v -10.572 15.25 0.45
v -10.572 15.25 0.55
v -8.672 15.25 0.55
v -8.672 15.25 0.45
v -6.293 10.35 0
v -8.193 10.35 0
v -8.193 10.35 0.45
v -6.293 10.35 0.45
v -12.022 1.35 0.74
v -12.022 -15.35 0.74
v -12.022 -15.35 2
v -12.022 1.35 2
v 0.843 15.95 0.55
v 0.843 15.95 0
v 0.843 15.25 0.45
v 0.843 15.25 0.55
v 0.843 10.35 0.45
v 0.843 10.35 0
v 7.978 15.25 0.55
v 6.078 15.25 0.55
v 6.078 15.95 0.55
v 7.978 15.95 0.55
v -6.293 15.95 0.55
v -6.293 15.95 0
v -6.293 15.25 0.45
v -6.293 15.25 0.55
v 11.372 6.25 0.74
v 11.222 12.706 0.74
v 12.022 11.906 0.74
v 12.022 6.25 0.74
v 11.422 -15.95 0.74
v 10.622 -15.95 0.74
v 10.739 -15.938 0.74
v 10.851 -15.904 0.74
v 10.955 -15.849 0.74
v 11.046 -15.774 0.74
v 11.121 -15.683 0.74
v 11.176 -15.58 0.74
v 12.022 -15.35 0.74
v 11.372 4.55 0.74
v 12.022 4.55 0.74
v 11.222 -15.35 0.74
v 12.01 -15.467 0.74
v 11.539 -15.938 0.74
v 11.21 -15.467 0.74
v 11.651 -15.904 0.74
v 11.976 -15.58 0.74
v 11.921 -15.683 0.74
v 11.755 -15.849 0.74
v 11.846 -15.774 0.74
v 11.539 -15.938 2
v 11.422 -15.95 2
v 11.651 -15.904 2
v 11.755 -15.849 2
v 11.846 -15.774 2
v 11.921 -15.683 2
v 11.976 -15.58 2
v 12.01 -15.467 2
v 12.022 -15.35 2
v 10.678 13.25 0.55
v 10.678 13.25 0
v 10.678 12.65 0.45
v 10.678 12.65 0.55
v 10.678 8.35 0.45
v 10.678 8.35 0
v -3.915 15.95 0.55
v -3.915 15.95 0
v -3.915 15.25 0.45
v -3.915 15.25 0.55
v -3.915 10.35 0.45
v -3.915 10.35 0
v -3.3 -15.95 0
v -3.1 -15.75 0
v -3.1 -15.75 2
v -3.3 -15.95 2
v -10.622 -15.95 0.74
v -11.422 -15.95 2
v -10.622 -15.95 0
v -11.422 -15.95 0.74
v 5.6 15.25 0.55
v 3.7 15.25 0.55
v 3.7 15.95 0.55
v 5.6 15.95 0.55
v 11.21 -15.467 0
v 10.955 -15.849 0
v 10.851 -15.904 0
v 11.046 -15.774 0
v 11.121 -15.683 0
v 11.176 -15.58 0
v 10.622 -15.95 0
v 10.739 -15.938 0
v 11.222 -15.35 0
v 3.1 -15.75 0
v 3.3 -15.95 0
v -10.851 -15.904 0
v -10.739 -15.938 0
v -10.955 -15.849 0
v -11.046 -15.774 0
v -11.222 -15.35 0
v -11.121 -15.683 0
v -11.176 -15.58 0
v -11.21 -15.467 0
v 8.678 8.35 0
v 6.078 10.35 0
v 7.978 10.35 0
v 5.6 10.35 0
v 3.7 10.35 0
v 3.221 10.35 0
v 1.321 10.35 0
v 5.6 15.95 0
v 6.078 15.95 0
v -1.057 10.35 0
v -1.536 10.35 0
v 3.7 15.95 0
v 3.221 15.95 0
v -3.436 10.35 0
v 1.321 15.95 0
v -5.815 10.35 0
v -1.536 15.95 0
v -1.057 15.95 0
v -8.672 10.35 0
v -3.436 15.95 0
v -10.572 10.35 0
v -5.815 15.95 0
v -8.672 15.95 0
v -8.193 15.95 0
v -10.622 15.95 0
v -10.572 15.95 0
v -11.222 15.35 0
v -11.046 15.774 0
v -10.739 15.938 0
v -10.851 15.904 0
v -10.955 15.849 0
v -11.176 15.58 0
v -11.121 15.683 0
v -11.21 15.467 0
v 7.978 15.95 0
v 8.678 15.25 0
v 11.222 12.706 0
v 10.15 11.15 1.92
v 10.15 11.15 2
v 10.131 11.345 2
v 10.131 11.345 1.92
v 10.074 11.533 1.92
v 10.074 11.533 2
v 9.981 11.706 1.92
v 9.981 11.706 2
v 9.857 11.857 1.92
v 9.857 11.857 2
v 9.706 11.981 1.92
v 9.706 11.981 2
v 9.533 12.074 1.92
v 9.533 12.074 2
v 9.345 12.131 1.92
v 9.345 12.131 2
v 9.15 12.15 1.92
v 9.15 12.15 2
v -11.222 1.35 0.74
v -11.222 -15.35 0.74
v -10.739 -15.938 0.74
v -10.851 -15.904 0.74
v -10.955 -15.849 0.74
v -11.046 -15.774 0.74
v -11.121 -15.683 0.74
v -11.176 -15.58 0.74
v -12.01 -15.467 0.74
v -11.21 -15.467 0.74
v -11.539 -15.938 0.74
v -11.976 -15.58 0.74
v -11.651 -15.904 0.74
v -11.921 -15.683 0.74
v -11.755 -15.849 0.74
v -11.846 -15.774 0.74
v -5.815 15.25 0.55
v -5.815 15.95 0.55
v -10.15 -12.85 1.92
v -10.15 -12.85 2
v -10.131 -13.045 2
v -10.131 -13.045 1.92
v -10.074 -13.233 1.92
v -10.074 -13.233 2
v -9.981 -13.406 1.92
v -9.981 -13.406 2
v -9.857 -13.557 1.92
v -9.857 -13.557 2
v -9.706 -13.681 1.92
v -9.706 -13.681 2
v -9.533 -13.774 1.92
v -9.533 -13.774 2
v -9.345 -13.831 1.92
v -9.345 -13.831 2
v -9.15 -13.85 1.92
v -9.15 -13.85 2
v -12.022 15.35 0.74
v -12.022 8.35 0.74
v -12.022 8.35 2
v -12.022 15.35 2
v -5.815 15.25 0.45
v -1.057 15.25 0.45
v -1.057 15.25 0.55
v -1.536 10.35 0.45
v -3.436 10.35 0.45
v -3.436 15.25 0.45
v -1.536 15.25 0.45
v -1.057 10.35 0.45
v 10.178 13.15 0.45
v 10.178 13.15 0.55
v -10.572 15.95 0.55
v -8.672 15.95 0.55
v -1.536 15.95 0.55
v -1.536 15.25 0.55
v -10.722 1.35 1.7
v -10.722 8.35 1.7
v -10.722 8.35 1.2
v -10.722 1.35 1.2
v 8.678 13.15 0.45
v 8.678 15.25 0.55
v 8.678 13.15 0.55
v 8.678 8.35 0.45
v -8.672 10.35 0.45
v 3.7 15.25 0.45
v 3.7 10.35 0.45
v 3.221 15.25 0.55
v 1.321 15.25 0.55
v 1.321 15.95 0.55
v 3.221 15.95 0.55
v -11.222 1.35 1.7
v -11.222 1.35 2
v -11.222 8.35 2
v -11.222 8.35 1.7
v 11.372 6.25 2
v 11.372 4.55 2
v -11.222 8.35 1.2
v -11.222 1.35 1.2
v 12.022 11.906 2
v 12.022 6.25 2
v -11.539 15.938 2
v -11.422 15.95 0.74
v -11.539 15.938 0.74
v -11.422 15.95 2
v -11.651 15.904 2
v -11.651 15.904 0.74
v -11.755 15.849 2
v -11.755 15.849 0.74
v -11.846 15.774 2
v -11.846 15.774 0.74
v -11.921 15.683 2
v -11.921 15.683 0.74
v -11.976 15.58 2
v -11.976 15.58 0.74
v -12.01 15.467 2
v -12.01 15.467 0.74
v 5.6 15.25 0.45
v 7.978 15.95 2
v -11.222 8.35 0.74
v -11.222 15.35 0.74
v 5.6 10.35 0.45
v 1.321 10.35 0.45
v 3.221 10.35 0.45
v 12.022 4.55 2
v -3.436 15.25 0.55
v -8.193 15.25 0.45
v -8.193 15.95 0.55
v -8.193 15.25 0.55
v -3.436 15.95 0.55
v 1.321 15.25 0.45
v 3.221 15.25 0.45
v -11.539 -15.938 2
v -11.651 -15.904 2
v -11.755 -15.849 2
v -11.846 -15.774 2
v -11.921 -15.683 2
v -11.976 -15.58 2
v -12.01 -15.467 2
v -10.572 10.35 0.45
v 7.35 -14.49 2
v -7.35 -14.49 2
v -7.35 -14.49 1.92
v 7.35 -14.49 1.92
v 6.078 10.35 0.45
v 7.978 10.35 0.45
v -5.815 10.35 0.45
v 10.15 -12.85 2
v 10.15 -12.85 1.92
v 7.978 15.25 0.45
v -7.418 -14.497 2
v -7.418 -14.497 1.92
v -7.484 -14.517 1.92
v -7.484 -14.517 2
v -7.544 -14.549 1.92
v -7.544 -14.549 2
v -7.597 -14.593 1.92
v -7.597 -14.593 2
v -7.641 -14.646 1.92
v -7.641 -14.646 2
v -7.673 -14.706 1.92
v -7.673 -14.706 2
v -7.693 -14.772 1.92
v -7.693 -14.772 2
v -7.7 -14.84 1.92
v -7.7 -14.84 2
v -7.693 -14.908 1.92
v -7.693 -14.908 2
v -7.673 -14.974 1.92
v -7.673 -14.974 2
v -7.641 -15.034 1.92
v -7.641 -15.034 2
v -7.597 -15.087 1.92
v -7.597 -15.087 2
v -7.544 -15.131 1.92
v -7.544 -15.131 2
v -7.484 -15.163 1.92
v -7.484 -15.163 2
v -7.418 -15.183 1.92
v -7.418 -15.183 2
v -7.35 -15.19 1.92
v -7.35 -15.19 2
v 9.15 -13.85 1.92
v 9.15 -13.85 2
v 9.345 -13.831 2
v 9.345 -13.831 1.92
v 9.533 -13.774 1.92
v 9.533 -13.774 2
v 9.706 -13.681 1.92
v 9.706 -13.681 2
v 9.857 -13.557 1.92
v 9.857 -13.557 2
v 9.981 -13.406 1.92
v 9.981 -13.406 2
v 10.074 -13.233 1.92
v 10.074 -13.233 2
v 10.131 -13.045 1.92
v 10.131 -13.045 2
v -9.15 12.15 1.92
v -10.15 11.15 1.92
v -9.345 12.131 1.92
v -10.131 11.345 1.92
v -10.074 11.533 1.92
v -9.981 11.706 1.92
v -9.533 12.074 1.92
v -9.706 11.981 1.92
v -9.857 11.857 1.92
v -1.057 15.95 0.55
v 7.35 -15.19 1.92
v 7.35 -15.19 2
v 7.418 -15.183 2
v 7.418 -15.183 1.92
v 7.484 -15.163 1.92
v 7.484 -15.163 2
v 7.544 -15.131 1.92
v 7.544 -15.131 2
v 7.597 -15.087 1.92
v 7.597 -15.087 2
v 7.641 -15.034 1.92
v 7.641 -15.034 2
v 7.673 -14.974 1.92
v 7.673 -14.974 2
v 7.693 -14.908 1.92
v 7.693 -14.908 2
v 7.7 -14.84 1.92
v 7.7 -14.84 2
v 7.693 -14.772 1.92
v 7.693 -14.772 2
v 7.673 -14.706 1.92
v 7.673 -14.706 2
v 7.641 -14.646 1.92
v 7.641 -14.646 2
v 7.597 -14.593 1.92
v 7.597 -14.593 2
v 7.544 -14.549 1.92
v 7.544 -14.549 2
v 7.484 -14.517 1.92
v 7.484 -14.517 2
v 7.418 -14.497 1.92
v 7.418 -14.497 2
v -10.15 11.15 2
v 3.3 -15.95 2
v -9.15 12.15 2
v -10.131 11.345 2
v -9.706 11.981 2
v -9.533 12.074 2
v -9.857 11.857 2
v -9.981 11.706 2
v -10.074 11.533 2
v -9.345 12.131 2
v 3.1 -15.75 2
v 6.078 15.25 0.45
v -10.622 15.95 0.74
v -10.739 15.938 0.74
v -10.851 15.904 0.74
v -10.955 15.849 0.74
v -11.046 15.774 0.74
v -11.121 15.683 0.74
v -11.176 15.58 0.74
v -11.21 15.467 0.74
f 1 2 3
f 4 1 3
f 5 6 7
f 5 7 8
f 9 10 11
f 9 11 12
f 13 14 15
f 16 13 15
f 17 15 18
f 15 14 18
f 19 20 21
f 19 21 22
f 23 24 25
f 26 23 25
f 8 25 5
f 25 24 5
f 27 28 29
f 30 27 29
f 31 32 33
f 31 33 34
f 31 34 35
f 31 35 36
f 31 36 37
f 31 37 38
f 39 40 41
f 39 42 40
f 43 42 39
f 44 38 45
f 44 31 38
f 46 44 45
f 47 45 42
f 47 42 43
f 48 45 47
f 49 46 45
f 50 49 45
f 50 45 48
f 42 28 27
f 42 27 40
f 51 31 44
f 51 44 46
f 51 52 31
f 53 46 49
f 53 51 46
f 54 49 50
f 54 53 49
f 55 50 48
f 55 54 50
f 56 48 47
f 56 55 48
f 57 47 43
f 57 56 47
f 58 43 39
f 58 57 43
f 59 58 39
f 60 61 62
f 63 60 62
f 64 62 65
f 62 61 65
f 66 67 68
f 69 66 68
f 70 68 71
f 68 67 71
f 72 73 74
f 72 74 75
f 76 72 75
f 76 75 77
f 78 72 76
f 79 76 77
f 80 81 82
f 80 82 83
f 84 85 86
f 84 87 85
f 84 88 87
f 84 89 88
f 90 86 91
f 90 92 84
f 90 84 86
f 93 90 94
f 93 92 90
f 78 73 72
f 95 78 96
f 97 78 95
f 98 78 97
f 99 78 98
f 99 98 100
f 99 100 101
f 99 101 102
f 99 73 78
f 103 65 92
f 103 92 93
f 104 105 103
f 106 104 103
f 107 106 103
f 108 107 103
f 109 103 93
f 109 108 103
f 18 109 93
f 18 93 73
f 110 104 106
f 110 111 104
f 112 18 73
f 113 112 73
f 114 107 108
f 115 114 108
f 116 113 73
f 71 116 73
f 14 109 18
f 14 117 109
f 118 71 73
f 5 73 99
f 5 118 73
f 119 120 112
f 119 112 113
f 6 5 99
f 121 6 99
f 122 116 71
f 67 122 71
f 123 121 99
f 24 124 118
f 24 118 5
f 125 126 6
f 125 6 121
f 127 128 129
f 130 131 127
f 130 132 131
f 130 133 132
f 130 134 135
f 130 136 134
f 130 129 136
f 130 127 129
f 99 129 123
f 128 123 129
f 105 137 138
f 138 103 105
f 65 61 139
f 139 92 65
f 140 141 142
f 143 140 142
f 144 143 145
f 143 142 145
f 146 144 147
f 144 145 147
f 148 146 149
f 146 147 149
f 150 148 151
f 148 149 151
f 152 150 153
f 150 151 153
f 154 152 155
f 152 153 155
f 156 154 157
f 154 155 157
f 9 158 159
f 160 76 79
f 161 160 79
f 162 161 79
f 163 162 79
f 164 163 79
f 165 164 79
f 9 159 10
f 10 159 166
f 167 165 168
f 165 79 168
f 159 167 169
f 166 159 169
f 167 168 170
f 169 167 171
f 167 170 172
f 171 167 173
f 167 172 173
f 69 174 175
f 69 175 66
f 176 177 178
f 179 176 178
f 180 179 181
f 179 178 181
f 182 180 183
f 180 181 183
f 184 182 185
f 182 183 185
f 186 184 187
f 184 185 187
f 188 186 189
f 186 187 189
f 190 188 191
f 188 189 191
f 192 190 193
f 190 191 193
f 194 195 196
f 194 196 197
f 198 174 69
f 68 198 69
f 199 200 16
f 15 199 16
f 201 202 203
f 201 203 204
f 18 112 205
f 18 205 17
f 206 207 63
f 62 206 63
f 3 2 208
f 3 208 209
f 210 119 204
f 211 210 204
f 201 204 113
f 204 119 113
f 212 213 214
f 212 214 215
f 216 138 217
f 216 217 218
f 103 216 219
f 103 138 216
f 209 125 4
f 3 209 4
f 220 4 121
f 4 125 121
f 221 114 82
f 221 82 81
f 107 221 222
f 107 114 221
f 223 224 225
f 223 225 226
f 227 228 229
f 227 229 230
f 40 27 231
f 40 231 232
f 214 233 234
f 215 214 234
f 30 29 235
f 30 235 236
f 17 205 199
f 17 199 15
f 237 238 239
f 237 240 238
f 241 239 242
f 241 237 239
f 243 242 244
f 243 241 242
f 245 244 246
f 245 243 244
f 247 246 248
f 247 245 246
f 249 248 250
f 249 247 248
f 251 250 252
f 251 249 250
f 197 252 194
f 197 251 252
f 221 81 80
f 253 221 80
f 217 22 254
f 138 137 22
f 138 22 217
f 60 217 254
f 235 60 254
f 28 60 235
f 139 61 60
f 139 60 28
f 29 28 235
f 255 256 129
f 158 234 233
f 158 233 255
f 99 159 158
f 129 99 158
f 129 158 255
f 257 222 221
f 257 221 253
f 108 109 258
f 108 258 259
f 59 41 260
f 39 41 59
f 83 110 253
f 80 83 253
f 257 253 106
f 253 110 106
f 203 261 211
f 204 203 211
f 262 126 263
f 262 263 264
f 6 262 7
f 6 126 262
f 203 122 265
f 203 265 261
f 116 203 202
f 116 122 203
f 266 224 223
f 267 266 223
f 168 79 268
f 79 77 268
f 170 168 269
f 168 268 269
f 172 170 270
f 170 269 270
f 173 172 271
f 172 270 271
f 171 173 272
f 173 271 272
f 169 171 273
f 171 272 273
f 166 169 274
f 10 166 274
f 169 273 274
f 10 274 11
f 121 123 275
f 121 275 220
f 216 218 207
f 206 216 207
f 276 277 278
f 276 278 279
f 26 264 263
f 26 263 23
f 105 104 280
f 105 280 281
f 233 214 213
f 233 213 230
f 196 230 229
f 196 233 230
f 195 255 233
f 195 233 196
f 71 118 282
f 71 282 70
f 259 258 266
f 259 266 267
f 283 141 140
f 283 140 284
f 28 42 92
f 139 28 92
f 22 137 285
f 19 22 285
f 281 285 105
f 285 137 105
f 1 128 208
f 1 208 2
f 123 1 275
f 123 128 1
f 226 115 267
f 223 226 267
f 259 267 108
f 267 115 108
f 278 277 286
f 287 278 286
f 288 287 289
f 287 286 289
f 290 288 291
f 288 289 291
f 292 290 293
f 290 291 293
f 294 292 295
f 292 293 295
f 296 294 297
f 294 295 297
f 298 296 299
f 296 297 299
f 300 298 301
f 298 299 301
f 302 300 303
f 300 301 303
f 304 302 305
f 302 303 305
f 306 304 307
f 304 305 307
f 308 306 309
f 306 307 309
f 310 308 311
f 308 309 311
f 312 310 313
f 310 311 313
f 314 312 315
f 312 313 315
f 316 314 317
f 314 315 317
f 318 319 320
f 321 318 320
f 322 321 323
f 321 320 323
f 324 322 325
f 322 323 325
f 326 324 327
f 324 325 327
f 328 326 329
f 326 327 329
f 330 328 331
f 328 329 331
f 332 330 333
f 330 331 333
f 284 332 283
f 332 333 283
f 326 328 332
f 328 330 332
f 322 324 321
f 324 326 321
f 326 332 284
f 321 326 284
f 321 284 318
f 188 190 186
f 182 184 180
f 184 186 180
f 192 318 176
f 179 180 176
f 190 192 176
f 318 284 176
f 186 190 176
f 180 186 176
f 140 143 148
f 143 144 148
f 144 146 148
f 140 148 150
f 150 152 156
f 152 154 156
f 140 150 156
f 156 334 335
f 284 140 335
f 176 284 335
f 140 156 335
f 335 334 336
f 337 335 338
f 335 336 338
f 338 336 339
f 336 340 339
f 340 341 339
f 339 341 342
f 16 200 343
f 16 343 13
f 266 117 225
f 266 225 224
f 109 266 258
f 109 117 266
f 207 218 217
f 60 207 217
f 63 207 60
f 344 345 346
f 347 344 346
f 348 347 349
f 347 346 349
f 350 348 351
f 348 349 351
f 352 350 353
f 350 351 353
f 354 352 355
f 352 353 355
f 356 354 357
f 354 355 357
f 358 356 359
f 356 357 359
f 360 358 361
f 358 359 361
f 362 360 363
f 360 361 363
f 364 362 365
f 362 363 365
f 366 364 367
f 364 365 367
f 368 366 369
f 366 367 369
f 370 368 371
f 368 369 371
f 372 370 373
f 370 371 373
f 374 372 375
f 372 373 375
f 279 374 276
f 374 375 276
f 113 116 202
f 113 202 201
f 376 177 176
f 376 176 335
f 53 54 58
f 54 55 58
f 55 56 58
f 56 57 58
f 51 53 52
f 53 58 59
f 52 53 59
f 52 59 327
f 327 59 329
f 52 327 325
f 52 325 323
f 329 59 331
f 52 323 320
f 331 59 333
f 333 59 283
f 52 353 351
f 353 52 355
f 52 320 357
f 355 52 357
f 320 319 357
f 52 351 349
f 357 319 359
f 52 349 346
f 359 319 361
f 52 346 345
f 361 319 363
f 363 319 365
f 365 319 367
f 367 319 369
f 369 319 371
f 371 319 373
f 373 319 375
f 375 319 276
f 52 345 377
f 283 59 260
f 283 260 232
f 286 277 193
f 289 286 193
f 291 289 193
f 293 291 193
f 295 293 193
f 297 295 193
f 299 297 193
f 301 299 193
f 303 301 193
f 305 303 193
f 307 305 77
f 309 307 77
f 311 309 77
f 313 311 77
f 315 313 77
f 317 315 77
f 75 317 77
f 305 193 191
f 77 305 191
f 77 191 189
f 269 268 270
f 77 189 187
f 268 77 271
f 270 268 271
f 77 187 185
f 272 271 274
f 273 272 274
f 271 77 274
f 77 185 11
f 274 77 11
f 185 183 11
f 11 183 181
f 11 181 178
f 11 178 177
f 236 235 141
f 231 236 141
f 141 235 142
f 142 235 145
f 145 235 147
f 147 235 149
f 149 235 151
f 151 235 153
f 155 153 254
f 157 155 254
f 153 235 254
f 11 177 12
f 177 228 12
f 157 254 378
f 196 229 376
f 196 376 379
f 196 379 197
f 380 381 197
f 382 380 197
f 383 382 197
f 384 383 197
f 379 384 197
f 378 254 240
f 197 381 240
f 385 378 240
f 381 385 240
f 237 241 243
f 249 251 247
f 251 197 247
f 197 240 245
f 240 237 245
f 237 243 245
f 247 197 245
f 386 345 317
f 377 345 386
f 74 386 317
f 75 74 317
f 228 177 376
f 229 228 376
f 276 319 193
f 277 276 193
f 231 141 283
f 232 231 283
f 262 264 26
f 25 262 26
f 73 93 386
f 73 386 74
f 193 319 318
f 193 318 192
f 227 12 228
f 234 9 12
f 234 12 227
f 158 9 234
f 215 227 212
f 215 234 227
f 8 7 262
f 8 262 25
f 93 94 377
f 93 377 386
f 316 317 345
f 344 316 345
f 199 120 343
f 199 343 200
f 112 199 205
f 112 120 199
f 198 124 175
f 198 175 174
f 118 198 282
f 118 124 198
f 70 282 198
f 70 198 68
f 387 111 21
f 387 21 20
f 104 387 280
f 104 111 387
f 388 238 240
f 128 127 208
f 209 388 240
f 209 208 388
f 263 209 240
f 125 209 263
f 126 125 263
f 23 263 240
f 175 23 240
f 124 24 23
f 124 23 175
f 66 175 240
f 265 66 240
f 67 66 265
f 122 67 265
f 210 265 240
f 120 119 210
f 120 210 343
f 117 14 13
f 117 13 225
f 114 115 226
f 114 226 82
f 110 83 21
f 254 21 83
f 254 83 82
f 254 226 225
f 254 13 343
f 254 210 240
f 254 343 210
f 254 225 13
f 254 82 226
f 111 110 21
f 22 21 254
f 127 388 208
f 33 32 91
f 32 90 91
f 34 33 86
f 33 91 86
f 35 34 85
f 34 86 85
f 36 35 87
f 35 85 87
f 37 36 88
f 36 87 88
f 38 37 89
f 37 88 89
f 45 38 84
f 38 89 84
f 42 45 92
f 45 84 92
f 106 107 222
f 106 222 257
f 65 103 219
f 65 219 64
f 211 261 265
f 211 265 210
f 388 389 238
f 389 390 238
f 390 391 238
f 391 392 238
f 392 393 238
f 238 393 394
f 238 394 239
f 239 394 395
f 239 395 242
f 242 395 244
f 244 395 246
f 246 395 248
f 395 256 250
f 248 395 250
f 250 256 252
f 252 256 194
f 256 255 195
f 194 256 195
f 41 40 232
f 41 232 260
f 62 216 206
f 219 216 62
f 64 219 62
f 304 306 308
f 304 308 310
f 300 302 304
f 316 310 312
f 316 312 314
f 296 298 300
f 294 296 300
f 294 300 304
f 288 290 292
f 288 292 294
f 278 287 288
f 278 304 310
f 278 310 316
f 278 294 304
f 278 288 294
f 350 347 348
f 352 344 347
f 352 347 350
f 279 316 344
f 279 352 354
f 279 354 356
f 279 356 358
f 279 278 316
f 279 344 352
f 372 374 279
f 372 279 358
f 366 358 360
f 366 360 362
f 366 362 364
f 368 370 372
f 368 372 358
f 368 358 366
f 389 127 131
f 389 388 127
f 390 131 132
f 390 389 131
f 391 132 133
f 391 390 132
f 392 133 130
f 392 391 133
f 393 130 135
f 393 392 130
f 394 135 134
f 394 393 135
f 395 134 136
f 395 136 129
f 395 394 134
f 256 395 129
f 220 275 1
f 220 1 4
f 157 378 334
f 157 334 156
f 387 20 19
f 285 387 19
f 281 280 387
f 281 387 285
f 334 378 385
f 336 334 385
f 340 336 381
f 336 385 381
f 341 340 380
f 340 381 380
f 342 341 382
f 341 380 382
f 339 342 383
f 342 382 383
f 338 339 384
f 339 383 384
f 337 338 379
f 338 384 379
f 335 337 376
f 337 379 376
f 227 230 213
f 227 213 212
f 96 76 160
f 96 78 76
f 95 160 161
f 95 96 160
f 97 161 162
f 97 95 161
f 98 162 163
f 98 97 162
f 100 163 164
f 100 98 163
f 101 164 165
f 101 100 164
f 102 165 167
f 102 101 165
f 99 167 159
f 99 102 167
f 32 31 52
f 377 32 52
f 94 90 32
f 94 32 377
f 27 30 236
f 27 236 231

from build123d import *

# Parameters (mm, degrees)
PAD_DEPTH              = 2
POCKET_DEPTH           = 0.08
POCKET001_DEPTH        = 0.08
SKETCH003_W            = 1.9
SKETCH003_H            = 6.6
POCKET002_DEPTH        = 0.55
LINEARPATTERN_COUNT    = 8
LINEARPATTERN_PITCH    = 2.378571
SKETCH004_W            = 2
SKETCH004_H            = 8.6
POCKET003_DEPTH        = 0.55
SKETCH005_W            = 1.9
SKETCH005_H            = 4.9
PAD001_DEPTH           = 0.1
LINEARPATTERN001_COUNT = 8
LINEARPATTERN001_PITCH = 2.378571
PAD002_DEPTH           = 0.1
POCKET004_DEPTH        = 111.893571
SKETCH008_W            = 7
SKETCH008_H            = 0.5
POCKET007_DEPTH        = 0.5
FILLET_R               = 0.6


with BuildPart() as part:
    # Sketch → Pad (new body)
    with BuildSketch(Plane.XY):
        Polygon((-12.021781, 15.95), (7.978219, 15.95), (12.021781, 11.906439), (12.021781, 6.25), (11.371781, 6.25), (11.371781, 4.55), (12.021781, 4.55), (12.021781, -15.95), (3.3, -15.95), (3.1, -15.75), (-3.1, -15.75), (-3.3, -15.95), (-12.021781, -15.95), (-12.021781, 1.35), (-11.221781, 1.35), (-11.221781, 8.35), (-12.021781, 8.35), align=None)
    extrude(amount=PAD_DEPTH)

    # Sketch001 → Pocket (cut)
    with BuildSketch(Plane.XY.offset(2)):
        with BuildLine():
            Line((-9.15, 12.15), (9.15, 12.15))
            ThreePointArc((10.15, 11.15), (9.857107, 11.857107), (9.15, 12.15))
            Line((10.15, 11.15), (10.15, -12.85))
            ThreePointArc((9.15, -13.85), (9.857107, -13.557107), (10.15, -12.85))
            Line((9.15, -13.85), (-9.15, -13.85))
            ThreePointArc((-10.15, -12.85), (-9.857107, -13.557107), (-9.15, -13.85))
            Line((-10.15, -12.85), (-10.15, 11.15))
            ThreePointArc((-9.15, 12.15), (-9.857107, 11.857107), (-10.15, 11.15))
        make_face()
    extrude(amount=-POCKET_DEPTH, mode=Mode.SUBTRACT)

    # Sketch002 → Pocket001 (cut)
    with BuildSketch(Plane.XY.offset(2)):
        with BuildLine():
            ThreePointArc((-7.35, -14.49), (-7.7, -14.84), (-7.35, -15.19))
            Line((-7.35, -15.19), (7.35, -15.19))
            ThreePointArc((7.35, -15.19), (7.7, -14.84), (7.35, -14.49))
            Line((-7.35, -14.49), (7.35, -14.49))
        make_face()
    extrude(amount=-POCKET001_DEPTH, mode=Mode.SUBTRACT)

    # Sketch003 → Pocket002 (cut)
    with BuildSketch(Plane(origin=(0, 0, 0), x_dir=(1, 0, 0), z_dir=(0, 0, -1))):
        with Locations((7.028219, -13.65)):
            Rectangle(SKETCH003_W, SKETCH003_H)
    pocket002 = extrude(amount=-POCKET002_DEPTH, mode=Mode.SUBTRACT)

    # LinearPattern: Pocket002 ×8
    with Locations(*[(-i * LINEARPATTERN_PITCH, 0, 0) for i in range(1, LINEARPATTERN_COUNT)]):
        add(pocket002, mode=Mode.SUBTRACT)

    # Sketch004 → Pocket003 (cut)
    with BuildSketch(Plane(origin=(0, 0, 0), x_dir=(1, 0, 0), z_dir=(0, 0, -1))):
        with Locations((9.678219, -12.65)):
            Rectangle(SKETCH004_W, SKETCH004_H)
    extrude(amount=-POCKET003_DEPTH, mode=Mode.SUBTRACT)

    # Sketch005 → Pad001 (new body)
    with BuildSketch(Plane(origin=(0, 0, 0.55), x_dir=(1, 0, 0), z_dir=(0, 0, -1))):
        with Locations((7.028219, -12.8)):
            Rectangle(SKETCH005_W, SKETCH005_H)
    pad001 = extrude(amount=PAD001_DEPTH)

    # LinearPattern001: Pad001 ×8
    with Locations(*[(-i * LINEARPATTERN001_PITCH, 0, 0) for i in range(1, LINEARPATTERN001_COUNT)]):
        add(pad001)

    # Sketch006 → Pad002 (new body)
    with BuildSketch(Plane(origin=(0, 0, 0.55), x_dir=(1, 0, 0), z_dir=(0, 0, -1))):
        Polygon((8.678219, -8.35), (8.678219, -13.15), (10.17822, -13.15), (10.678219, -12.650001), (10.678219, -8.35), align=None)
    extrude(amount=PAD002_DEPTH)

    # Sketch007 → Pocket004 (cut, through all)
    with BuildSketch(Plane.XZ.offset(15.95)):
        Polygon((-11.221781, 0.74), (-11.221781, -0.191555), (-12.614112, -0.191555), (-12.614112, 0), (-12.614112, 0.74), (-12.021781, 0.74), align=None)
    pocket004 = extrude(amount=-POCKET004_DEPTH, mode=Mode.SUBTRACT)

    # Mirrored: Pocket004 across Sketch007 V_Axis
    add(pocket004.mirror(Plane(origin=(0, -15.95, 0), x_dir=(0, -1, 0), z_dir=(1, 0, 0))), mode=Mode.SUBTRACT)

    # Sketch008 → Pocket007 (cut)
    with BuildSketch(Plane(origin=(-11.221781, 0, 0), x_dir=(0, -1, 0), z_dir=(-1, 0, 0))):
        with Locations((-4.85, 1.45)):
            Rectangle(SKETCH008_W, SKETCH008_H)
    extrude(amount=-POCKET007_DEPTH, mode=Mode.SUBTRACT)

    # Fillet
    fillet_edges = [part.edges().sort_by_distance(p)[0] for p in [
        (-12.021781, -15.95, 1.37),
        (-11.221781, -15.95, 0.37),
        (-12.021781, 15.95, 1.37),
        (11.221781, -15.95, 0.37),
        (12.021781, -15.95, 1.37),
        (-11.221781, 15.95, 0.37),
    ]]
    fillet(fillet_edges, radius=FILLET_R)


solid = part.part
